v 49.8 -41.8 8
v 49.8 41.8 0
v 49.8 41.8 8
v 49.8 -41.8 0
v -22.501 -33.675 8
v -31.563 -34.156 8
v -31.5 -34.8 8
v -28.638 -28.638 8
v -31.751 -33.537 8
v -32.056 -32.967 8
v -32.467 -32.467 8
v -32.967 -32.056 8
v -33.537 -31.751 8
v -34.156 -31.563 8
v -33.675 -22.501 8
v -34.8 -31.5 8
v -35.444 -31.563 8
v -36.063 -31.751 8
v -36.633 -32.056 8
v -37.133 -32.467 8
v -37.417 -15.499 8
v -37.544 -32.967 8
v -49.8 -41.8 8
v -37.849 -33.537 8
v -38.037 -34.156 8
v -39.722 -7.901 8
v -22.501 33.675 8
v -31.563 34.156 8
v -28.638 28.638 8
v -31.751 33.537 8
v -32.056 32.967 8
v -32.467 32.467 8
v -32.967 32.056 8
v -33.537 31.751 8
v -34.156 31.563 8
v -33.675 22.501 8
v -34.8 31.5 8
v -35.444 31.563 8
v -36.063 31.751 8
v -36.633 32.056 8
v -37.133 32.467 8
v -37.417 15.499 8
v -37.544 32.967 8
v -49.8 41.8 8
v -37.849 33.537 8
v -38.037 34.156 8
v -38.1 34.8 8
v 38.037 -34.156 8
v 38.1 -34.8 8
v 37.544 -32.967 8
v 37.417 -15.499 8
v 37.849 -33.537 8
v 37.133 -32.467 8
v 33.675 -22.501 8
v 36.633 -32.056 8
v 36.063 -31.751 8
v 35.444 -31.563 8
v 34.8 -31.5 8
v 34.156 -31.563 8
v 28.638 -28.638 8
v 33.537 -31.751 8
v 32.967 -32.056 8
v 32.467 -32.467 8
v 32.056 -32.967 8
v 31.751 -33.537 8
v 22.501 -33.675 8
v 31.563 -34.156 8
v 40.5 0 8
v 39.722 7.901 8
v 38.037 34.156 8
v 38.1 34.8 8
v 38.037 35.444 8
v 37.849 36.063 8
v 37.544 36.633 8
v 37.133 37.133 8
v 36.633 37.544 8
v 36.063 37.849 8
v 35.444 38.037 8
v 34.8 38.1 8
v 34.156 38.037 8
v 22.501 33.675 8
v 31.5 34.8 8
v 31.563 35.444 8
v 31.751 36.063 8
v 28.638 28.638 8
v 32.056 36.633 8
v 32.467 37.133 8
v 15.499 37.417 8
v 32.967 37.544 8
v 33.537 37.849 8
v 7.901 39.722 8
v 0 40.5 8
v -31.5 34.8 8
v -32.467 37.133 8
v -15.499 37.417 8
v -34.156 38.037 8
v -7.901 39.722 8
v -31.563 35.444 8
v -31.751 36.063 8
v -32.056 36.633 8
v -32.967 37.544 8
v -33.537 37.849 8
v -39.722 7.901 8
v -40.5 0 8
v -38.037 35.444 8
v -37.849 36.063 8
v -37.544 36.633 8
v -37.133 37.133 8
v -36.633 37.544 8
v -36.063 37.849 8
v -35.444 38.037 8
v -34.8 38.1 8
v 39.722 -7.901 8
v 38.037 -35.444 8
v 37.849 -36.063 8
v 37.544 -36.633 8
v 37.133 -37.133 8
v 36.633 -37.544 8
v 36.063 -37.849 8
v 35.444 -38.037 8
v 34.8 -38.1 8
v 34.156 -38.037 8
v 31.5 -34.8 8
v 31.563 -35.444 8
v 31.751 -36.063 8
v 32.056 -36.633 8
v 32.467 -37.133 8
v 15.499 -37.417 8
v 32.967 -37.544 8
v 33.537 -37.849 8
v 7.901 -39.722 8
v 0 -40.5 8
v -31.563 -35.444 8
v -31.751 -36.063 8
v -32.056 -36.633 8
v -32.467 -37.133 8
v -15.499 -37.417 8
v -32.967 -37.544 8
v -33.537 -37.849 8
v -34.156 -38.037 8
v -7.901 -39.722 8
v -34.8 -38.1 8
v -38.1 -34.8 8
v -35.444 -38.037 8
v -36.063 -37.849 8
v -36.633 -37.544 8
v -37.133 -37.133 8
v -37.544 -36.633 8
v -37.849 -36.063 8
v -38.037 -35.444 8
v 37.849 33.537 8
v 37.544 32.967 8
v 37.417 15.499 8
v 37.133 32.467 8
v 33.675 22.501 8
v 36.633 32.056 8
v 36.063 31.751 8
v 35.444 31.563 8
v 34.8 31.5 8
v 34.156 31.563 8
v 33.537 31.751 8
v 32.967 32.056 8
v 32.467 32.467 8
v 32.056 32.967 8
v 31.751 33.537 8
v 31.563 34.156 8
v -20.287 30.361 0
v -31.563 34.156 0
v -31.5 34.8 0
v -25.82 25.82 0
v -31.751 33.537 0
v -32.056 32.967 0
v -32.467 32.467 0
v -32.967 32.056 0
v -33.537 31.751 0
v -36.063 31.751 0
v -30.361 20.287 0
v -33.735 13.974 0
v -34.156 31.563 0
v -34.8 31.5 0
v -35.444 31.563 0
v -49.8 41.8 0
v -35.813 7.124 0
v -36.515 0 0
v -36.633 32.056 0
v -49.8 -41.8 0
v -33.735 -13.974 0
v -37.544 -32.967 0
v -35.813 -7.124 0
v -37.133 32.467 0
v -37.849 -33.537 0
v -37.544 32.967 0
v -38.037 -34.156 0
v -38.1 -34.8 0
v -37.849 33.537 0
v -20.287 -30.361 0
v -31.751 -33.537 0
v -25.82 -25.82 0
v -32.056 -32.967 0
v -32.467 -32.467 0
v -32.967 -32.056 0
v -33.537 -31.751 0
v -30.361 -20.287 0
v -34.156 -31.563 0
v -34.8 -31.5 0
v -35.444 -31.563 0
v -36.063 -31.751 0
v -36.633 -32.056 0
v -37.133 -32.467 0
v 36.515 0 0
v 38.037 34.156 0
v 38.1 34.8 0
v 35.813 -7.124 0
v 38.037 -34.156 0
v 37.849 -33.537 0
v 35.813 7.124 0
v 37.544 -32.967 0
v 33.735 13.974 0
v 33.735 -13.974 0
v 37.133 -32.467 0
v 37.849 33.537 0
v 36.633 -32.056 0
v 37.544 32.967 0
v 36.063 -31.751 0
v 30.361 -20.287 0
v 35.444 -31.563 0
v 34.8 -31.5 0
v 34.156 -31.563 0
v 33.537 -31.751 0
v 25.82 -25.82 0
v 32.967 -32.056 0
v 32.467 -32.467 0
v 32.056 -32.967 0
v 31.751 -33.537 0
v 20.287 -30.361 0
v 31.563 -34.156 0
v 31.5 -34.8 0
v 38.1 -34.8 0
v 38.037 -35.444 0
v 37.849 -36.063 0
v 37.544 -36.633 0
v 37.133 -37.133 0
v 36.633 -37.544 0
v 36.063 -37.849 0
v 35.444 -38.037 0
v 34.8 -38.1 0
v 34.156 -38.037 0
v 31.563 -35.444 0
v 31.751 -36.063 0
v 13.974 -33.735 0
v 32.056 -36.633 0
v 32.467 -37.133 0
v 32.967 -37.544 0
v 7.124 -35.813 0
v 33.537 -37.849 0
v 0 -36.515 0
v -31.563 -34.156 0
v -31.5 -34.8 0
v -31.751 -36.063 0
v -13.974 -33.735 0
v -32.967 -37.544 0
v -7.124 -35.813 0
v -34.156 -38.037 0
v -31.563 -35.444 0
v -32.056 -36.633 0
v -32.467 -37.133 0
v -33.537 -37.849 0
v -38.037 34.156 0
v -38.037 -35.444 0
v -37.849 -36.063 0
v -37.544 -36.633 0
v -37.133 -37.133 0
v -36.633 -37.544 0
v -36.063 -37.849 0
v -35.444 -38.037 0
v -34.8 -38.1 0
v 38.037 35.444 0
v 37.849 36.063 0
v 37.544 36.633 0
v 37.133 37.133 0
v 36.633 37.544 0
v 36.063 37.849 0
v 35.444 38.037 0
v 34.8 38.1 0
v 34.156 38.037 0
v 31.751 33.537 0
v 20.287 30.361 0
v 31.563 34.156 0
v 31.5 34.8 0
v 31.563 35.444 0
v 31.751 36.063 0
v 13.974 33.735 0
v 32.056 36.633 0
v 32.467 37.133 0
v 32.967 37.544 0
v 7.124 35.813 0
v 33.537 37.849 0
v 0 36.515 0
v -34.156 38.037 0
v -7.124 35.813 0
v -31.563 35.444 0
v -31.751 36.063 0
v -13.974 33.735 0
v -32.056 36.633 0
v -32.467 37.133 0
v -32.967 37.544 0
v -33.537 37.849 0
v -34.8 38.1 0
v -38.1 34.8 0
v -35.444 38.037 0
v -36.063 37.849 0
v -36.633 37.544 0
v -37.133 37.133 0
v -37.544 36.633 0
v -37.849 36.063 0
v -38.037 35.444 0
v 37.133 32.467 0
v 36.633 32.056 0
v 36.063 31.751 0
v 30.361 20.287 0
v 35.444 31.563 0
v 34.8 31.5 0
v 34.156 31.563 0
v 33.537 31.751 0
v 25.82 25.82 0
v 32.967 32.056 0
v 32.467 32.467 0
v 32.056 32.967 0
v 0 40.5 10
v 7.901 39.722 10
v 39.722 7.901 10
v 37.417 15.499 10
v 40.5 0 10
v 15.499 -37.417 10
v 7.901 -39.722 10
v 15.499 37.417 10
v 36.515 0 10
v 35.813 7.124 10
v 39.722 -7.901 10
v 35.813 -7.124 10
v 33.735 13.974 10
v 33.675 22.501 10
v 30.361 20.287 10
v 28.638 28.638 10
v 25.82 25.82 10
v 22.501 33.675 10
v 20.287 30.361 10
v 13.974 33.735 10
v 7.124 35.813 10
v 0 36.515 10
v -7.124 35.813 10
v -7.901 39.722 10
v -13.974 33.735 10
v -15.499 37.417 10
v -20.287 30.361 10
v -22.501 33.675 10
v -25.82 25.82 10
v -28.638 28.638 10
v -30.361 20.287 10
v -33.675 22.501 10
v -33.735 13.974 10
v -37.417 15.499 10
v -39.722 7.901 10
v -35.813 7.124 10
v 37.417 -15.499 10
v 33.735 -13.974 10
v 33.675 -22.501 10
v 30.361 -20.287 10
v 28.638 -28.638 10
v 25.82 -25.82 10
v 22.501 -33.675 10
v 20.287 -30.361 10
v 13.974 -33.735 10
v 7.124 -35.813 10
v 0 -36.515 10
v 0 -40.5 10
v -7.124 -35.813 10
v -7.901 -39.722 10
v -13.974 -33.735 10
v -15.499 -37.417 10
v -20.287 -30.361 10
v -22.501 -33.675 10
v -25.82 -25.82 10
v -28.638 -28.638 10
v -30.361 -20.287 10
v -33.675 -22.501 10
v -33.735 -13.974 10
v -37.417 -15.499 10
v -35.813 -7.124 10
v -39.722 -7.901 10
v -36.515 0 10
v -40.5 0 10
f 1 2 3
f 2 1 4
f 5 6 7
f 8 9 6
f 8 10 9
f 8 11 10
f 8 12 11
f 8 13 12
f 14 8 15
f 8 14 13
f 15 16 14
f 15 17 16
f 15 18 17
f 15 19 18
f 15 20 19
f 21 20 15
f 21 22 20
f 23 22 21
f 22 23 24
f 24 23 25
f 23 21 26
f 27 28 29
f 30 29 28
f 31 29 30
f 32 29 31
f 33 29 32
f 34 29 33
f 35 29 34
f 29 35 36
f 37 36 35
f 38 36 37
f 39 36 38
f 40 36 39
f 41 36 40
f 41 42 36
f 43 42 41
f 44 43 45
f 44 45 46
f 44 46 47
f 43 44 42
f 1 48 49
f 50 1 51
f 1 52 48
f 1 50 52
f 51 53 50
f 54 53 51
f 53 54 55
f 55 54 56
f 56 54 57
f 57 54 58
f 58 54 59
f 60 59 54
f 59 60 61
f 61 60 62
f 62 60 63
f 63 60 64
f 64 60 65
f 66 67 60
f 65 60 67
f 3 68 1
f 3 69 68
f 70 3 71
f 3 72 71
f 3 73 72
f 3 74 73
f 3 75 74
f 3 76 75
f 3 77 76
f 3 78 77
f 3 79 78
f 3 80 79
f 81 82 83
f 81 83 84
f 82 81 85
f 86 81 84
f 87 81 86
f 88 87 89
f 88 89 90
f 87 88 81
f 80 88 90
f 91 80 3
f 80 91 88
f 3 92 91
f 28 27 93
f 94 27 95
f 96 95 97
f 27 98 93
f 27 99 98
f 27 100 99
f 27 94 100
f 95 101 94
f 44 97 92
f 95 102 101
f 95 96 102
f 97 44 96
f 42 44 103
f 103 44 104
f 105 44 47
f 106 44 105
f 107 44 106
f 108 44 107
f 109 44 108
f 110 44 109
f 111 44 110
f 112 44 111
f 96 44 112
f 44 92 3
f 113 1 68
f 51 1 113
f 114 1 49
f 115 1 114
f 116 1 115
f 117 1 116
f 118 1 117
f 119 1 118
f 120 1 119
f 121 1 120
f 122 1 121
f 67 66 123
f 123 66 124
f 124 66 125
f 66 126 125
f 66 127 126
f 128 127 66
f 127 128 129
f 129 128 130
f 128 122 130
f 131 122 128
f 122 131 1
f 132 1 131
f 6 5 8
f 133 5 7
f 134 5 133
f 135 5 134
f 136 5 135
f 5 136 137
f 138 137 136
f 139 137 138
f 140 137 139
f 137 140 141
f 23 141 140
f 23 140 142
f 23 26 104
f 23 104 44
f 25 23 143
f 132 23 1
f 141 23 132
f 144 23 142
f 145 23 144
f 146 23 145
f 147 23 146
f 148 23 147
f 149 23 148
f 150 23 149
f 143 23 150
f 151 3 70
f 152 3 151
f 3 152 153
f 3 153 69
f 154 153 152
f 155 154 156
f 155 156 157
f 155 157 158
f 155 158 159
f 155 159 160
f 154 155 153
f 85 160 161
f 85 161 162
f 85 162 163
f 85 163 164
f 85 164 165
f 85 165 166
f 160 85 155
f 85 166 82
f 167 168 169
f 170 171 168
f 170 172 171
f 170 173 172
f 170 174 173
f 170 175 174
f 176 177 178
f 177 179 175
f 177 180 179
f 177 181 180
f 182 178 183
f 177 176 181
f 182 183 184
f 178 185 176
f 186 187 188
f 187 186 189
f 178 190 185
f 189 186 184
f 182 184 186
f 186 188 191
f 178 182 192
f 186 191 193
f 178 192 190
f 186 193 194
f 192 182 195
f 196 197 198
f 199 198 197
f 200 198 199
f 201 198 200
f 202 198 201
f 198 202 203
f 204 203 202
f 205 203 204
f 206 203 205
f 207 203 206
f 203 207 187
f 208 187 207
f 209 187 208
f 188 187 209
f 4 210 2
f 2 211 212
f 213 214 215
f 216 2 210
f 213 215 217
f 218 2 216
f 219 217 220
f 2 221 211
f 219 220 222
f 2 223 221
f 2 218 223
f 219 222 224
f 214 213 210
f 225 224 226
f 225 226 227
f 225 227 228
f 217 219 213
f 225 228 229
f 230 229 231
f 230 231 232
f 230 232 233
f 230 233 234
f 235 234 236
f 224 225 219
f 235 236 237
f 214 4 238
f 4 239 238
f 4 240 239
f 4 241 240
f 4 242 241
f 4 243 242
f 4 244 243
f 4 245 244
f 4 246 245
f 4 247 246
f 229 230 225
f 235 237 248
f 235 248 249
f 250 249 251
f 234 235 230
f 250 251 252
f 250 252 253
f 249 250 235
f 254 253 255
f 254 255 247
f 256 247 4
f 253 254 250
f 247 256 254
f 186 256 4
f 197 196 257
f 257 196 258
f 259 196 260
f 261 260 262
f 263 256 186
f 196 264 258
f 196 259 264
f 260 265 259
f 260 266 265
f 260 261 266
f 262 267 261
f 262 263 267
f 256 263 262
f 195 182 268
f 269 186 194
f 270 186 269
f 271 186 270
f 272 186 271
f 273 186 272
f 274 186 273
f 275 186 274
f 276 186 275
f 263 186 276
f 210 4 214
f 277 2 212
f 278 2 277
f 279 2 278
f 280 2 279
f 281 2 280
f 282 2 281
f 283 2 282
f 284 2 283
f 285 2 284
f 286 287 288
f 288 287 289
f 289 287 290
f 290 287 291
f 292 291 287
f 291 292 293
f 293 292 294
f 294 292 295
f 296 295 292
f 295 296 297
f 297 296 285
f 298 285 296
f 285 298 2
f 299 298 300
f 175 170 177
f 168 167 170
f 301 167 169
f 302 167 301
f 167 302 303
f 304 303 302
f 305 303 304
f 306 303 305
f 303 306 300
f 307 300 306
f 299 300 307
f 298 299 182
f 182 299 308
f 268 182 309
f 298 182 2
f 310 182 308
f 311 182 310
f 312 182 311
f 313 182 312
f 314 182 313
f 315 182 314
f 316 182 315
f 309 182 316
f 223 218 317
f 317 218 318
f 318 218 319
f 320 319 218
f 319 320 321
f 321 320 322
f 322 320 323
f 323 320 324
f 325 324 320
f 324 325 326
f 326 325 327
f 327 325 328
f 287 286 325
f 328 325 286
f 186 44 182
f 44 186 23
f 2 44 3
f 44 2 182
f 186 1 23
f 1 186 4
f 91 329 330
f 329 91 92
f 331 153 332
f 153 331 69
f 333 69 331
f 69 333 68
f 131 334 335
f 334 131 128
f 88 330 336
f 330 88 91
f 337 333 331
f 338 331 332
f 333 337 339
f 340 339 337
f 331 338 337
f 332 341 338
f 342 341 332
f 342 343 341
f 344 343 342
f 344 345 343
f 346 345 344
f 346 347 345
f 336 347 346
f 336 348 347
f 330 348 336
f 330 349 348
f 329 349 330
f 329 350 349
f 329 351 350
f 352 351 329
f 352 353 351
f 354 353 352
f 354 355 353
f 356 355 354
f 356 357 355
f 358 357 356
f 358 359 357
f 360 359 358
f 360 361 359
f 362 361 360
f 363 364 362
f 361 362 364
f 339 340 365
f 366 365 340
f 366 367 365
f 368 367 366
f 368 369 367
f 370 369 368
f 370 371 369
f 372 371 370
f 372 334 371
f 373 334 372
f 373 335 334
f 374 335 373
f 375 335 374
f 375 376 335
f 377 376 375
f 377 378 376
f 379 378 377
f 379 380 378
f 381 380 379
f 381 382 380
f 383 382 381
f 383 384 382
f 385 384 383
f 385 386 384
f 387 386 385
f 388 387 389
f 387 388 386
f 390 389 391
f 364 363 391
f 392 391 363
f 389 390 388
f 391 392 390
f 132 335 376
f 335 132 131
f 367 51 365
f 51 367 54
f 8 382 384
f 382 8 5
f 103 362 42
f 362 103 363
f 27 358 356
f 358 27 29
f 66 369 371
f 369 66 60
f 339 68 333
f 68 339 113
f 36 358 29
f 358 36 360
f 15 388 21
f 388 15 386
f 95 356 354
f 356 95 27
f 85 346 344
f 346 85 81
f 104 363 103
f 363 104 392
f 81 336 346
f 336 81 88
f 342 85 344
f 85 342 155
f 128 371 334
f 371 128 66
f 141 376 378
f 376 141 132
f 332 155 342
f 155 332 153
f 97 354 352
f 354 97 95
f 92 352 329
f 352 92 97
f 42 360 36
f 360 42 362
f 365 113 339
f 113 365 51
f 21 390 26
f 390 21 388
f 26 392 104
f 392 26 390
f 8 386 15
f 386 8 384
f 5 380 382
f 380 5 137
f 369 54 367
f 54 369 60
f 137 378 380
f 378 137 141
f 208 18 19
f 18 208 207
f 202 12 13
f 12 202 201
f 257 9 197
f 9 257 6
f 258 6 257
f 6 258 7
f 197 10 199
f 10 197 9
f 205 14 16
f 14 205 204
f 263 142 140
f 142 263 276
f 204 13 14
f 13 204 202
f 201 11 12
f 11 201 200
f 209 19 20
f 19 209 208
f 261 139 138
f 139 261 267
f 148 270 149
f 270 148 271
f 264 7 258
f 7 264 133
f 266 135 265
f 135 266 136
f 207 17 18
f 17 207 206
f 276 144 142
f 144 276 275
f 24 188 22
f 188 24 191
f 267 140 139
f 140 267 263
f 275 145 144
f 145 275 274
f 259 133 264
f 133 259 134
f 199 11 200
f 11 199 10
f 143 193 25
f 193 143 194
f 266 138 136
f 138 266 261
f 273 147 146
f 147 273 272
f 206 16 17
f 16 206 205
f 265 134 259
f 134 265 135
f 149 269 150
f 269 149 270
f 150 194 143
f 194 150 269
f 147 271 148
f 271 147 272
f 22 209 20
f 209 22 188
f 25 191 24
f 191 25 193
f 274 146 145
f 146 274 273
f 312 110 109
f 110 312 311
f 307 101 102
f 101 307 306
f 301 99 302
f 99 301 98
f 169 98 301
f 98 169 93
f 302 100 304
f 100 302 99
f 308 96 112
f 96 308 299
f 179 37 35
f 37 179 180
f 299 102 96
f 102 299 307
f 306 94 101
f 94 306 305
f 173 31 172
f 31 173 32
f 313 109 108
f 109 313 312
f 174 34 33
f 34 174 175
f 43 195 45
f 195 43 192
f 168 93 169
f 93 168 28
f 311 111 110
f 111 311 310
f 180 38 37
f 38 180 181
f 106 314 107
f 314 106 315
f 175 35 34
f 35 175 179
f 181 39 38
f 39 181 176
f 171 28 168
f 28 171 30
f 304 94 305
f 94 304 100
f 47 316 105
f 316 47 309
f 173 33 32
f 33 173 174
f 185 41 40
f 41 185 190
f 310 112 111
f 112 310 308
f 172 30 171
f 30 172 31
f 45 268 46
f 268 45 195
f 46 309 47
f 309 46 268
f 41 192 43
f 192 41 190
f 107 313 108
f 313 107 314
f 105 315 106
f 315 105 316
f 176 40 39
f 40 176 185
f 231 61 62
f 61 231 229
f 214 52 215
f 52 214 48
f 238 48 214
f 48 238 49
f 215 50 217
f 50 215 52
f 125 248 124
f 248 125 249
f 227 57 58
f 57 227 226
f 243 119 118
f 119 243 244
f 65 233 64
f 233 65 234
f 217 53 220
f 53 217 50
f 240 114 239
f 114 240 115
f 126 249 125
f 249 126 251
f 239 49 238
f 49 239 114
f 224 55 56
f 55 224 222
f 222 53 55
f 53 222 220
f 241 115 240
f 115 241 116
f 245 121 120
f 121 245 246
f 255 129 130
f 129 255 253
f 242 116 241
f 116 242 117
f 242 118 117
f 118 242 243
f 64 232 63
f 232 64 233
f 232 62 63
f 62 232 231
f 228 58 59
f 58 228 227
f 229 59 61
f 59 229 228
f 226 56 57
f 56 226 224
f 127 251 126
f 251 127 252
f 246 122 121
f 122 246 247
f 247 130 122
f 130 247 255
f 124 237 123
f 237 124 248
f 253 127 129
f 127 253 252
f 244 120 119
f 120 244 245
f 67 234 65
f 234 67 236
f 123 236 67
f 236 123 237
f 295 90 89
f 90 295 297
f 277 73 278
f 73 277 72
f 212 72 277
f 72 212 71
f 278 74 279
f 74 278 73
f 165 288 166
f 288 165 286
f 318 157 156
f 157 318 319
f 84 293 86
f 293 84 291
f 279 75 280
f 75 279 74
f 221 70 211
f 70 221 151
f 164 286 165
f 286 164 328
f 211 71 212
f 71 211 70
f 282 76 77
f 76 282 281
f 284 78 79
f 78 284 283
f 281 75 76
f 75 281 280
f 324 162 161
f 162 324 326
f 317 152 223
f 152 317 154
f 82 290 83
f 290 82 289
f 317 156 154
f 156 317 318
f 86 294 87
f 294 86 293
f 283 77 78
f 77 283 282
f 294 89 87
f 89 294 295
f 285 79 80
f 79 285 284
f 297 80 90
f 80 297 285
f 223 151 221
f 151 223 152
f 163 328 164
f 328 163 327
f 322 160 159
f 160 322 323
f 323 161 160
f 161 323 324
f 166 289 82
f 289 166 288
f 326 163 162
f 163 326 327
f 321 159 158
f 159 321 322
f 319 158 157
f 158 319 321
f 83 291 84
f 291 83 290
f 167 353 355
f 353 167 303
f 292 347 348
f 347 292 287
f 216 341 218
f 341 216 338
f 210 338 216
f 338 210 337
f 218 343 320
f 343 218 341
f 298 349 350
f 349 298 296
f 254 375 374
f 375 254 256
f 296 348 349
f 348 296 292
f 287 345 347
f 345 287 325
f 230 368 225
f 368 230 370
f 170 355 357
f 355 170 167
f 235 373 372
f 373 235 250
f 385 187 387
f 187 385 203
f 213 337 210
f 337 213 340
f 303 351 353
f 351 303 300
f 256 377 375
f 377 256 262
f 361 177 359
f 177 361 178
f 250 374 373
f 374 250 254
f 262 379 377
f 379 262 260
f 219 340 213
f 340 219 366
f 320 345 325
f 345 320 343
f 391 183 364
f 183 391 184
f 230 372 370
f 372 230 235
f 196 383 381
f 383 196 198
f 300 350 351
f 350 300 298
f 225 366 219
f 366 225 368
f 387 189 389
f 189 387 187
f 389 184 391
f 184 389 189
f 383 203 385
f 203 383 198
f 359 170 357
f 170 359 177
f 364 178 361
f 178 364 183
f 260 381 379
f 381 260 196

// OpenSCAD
$fn = 32;

// ----------------------------------------------------------------------
// Motor mount plate: NEMA34, 99.6 x 83.6 x 10 mm
// ----------------------------------------------------------------------

// --- parameters (mm) ---
plate_w = 99.6;           // plate length, X
plate_d = 83.6;           // plate width, Y
plate_t = 8;              // plate thickness
pattern = 69.6;           // NEMA34 bolt spacing
motor_d = 6.6;            // NEMA34 screw clearance
pilot_d = 73.03;          // pilot boss bore
boss_d = 81;              // raised pilot ring
boss_h = 2;               // raised pilot ring height
second_d = 4.5;           // second fastener hole
bc_r = 26.8;              // second bolt circle radius
bc_n = 8;                 // second bolt circle count

module plate() {
  translate([-plate_w / 2, -plate_d / 2, 0]) cube([plate_w, plate_d, plate_t]);
}

module motor_holes() {
  for (sx = [-1, 1]) for (sy = [-1, 1])
    translate([sx * pattern / 2, sy * pattern / 2, -1])
      cylinder(h = plate_t + 2, d = motor_d);
}
module pilot_ring() {
  translate([0, 0, plate_t - 1]) cylinder(h = boss_h + 1, d = boss_d);
}

difference() {
  union() {
    plate();
    pilot_ring();
  }
  motor_holes();
  translate([0, 0, -1]) cylinder(h = plate_t + boss_h + 2, d = pilot_d);
  for (i = [0 : bc_n - 1]) rotate([0, 0, i * 360 / bc_n]) translate([bc_r, 0, -1])    cylinder(h = plate_t + 2, d = second_d);
}
